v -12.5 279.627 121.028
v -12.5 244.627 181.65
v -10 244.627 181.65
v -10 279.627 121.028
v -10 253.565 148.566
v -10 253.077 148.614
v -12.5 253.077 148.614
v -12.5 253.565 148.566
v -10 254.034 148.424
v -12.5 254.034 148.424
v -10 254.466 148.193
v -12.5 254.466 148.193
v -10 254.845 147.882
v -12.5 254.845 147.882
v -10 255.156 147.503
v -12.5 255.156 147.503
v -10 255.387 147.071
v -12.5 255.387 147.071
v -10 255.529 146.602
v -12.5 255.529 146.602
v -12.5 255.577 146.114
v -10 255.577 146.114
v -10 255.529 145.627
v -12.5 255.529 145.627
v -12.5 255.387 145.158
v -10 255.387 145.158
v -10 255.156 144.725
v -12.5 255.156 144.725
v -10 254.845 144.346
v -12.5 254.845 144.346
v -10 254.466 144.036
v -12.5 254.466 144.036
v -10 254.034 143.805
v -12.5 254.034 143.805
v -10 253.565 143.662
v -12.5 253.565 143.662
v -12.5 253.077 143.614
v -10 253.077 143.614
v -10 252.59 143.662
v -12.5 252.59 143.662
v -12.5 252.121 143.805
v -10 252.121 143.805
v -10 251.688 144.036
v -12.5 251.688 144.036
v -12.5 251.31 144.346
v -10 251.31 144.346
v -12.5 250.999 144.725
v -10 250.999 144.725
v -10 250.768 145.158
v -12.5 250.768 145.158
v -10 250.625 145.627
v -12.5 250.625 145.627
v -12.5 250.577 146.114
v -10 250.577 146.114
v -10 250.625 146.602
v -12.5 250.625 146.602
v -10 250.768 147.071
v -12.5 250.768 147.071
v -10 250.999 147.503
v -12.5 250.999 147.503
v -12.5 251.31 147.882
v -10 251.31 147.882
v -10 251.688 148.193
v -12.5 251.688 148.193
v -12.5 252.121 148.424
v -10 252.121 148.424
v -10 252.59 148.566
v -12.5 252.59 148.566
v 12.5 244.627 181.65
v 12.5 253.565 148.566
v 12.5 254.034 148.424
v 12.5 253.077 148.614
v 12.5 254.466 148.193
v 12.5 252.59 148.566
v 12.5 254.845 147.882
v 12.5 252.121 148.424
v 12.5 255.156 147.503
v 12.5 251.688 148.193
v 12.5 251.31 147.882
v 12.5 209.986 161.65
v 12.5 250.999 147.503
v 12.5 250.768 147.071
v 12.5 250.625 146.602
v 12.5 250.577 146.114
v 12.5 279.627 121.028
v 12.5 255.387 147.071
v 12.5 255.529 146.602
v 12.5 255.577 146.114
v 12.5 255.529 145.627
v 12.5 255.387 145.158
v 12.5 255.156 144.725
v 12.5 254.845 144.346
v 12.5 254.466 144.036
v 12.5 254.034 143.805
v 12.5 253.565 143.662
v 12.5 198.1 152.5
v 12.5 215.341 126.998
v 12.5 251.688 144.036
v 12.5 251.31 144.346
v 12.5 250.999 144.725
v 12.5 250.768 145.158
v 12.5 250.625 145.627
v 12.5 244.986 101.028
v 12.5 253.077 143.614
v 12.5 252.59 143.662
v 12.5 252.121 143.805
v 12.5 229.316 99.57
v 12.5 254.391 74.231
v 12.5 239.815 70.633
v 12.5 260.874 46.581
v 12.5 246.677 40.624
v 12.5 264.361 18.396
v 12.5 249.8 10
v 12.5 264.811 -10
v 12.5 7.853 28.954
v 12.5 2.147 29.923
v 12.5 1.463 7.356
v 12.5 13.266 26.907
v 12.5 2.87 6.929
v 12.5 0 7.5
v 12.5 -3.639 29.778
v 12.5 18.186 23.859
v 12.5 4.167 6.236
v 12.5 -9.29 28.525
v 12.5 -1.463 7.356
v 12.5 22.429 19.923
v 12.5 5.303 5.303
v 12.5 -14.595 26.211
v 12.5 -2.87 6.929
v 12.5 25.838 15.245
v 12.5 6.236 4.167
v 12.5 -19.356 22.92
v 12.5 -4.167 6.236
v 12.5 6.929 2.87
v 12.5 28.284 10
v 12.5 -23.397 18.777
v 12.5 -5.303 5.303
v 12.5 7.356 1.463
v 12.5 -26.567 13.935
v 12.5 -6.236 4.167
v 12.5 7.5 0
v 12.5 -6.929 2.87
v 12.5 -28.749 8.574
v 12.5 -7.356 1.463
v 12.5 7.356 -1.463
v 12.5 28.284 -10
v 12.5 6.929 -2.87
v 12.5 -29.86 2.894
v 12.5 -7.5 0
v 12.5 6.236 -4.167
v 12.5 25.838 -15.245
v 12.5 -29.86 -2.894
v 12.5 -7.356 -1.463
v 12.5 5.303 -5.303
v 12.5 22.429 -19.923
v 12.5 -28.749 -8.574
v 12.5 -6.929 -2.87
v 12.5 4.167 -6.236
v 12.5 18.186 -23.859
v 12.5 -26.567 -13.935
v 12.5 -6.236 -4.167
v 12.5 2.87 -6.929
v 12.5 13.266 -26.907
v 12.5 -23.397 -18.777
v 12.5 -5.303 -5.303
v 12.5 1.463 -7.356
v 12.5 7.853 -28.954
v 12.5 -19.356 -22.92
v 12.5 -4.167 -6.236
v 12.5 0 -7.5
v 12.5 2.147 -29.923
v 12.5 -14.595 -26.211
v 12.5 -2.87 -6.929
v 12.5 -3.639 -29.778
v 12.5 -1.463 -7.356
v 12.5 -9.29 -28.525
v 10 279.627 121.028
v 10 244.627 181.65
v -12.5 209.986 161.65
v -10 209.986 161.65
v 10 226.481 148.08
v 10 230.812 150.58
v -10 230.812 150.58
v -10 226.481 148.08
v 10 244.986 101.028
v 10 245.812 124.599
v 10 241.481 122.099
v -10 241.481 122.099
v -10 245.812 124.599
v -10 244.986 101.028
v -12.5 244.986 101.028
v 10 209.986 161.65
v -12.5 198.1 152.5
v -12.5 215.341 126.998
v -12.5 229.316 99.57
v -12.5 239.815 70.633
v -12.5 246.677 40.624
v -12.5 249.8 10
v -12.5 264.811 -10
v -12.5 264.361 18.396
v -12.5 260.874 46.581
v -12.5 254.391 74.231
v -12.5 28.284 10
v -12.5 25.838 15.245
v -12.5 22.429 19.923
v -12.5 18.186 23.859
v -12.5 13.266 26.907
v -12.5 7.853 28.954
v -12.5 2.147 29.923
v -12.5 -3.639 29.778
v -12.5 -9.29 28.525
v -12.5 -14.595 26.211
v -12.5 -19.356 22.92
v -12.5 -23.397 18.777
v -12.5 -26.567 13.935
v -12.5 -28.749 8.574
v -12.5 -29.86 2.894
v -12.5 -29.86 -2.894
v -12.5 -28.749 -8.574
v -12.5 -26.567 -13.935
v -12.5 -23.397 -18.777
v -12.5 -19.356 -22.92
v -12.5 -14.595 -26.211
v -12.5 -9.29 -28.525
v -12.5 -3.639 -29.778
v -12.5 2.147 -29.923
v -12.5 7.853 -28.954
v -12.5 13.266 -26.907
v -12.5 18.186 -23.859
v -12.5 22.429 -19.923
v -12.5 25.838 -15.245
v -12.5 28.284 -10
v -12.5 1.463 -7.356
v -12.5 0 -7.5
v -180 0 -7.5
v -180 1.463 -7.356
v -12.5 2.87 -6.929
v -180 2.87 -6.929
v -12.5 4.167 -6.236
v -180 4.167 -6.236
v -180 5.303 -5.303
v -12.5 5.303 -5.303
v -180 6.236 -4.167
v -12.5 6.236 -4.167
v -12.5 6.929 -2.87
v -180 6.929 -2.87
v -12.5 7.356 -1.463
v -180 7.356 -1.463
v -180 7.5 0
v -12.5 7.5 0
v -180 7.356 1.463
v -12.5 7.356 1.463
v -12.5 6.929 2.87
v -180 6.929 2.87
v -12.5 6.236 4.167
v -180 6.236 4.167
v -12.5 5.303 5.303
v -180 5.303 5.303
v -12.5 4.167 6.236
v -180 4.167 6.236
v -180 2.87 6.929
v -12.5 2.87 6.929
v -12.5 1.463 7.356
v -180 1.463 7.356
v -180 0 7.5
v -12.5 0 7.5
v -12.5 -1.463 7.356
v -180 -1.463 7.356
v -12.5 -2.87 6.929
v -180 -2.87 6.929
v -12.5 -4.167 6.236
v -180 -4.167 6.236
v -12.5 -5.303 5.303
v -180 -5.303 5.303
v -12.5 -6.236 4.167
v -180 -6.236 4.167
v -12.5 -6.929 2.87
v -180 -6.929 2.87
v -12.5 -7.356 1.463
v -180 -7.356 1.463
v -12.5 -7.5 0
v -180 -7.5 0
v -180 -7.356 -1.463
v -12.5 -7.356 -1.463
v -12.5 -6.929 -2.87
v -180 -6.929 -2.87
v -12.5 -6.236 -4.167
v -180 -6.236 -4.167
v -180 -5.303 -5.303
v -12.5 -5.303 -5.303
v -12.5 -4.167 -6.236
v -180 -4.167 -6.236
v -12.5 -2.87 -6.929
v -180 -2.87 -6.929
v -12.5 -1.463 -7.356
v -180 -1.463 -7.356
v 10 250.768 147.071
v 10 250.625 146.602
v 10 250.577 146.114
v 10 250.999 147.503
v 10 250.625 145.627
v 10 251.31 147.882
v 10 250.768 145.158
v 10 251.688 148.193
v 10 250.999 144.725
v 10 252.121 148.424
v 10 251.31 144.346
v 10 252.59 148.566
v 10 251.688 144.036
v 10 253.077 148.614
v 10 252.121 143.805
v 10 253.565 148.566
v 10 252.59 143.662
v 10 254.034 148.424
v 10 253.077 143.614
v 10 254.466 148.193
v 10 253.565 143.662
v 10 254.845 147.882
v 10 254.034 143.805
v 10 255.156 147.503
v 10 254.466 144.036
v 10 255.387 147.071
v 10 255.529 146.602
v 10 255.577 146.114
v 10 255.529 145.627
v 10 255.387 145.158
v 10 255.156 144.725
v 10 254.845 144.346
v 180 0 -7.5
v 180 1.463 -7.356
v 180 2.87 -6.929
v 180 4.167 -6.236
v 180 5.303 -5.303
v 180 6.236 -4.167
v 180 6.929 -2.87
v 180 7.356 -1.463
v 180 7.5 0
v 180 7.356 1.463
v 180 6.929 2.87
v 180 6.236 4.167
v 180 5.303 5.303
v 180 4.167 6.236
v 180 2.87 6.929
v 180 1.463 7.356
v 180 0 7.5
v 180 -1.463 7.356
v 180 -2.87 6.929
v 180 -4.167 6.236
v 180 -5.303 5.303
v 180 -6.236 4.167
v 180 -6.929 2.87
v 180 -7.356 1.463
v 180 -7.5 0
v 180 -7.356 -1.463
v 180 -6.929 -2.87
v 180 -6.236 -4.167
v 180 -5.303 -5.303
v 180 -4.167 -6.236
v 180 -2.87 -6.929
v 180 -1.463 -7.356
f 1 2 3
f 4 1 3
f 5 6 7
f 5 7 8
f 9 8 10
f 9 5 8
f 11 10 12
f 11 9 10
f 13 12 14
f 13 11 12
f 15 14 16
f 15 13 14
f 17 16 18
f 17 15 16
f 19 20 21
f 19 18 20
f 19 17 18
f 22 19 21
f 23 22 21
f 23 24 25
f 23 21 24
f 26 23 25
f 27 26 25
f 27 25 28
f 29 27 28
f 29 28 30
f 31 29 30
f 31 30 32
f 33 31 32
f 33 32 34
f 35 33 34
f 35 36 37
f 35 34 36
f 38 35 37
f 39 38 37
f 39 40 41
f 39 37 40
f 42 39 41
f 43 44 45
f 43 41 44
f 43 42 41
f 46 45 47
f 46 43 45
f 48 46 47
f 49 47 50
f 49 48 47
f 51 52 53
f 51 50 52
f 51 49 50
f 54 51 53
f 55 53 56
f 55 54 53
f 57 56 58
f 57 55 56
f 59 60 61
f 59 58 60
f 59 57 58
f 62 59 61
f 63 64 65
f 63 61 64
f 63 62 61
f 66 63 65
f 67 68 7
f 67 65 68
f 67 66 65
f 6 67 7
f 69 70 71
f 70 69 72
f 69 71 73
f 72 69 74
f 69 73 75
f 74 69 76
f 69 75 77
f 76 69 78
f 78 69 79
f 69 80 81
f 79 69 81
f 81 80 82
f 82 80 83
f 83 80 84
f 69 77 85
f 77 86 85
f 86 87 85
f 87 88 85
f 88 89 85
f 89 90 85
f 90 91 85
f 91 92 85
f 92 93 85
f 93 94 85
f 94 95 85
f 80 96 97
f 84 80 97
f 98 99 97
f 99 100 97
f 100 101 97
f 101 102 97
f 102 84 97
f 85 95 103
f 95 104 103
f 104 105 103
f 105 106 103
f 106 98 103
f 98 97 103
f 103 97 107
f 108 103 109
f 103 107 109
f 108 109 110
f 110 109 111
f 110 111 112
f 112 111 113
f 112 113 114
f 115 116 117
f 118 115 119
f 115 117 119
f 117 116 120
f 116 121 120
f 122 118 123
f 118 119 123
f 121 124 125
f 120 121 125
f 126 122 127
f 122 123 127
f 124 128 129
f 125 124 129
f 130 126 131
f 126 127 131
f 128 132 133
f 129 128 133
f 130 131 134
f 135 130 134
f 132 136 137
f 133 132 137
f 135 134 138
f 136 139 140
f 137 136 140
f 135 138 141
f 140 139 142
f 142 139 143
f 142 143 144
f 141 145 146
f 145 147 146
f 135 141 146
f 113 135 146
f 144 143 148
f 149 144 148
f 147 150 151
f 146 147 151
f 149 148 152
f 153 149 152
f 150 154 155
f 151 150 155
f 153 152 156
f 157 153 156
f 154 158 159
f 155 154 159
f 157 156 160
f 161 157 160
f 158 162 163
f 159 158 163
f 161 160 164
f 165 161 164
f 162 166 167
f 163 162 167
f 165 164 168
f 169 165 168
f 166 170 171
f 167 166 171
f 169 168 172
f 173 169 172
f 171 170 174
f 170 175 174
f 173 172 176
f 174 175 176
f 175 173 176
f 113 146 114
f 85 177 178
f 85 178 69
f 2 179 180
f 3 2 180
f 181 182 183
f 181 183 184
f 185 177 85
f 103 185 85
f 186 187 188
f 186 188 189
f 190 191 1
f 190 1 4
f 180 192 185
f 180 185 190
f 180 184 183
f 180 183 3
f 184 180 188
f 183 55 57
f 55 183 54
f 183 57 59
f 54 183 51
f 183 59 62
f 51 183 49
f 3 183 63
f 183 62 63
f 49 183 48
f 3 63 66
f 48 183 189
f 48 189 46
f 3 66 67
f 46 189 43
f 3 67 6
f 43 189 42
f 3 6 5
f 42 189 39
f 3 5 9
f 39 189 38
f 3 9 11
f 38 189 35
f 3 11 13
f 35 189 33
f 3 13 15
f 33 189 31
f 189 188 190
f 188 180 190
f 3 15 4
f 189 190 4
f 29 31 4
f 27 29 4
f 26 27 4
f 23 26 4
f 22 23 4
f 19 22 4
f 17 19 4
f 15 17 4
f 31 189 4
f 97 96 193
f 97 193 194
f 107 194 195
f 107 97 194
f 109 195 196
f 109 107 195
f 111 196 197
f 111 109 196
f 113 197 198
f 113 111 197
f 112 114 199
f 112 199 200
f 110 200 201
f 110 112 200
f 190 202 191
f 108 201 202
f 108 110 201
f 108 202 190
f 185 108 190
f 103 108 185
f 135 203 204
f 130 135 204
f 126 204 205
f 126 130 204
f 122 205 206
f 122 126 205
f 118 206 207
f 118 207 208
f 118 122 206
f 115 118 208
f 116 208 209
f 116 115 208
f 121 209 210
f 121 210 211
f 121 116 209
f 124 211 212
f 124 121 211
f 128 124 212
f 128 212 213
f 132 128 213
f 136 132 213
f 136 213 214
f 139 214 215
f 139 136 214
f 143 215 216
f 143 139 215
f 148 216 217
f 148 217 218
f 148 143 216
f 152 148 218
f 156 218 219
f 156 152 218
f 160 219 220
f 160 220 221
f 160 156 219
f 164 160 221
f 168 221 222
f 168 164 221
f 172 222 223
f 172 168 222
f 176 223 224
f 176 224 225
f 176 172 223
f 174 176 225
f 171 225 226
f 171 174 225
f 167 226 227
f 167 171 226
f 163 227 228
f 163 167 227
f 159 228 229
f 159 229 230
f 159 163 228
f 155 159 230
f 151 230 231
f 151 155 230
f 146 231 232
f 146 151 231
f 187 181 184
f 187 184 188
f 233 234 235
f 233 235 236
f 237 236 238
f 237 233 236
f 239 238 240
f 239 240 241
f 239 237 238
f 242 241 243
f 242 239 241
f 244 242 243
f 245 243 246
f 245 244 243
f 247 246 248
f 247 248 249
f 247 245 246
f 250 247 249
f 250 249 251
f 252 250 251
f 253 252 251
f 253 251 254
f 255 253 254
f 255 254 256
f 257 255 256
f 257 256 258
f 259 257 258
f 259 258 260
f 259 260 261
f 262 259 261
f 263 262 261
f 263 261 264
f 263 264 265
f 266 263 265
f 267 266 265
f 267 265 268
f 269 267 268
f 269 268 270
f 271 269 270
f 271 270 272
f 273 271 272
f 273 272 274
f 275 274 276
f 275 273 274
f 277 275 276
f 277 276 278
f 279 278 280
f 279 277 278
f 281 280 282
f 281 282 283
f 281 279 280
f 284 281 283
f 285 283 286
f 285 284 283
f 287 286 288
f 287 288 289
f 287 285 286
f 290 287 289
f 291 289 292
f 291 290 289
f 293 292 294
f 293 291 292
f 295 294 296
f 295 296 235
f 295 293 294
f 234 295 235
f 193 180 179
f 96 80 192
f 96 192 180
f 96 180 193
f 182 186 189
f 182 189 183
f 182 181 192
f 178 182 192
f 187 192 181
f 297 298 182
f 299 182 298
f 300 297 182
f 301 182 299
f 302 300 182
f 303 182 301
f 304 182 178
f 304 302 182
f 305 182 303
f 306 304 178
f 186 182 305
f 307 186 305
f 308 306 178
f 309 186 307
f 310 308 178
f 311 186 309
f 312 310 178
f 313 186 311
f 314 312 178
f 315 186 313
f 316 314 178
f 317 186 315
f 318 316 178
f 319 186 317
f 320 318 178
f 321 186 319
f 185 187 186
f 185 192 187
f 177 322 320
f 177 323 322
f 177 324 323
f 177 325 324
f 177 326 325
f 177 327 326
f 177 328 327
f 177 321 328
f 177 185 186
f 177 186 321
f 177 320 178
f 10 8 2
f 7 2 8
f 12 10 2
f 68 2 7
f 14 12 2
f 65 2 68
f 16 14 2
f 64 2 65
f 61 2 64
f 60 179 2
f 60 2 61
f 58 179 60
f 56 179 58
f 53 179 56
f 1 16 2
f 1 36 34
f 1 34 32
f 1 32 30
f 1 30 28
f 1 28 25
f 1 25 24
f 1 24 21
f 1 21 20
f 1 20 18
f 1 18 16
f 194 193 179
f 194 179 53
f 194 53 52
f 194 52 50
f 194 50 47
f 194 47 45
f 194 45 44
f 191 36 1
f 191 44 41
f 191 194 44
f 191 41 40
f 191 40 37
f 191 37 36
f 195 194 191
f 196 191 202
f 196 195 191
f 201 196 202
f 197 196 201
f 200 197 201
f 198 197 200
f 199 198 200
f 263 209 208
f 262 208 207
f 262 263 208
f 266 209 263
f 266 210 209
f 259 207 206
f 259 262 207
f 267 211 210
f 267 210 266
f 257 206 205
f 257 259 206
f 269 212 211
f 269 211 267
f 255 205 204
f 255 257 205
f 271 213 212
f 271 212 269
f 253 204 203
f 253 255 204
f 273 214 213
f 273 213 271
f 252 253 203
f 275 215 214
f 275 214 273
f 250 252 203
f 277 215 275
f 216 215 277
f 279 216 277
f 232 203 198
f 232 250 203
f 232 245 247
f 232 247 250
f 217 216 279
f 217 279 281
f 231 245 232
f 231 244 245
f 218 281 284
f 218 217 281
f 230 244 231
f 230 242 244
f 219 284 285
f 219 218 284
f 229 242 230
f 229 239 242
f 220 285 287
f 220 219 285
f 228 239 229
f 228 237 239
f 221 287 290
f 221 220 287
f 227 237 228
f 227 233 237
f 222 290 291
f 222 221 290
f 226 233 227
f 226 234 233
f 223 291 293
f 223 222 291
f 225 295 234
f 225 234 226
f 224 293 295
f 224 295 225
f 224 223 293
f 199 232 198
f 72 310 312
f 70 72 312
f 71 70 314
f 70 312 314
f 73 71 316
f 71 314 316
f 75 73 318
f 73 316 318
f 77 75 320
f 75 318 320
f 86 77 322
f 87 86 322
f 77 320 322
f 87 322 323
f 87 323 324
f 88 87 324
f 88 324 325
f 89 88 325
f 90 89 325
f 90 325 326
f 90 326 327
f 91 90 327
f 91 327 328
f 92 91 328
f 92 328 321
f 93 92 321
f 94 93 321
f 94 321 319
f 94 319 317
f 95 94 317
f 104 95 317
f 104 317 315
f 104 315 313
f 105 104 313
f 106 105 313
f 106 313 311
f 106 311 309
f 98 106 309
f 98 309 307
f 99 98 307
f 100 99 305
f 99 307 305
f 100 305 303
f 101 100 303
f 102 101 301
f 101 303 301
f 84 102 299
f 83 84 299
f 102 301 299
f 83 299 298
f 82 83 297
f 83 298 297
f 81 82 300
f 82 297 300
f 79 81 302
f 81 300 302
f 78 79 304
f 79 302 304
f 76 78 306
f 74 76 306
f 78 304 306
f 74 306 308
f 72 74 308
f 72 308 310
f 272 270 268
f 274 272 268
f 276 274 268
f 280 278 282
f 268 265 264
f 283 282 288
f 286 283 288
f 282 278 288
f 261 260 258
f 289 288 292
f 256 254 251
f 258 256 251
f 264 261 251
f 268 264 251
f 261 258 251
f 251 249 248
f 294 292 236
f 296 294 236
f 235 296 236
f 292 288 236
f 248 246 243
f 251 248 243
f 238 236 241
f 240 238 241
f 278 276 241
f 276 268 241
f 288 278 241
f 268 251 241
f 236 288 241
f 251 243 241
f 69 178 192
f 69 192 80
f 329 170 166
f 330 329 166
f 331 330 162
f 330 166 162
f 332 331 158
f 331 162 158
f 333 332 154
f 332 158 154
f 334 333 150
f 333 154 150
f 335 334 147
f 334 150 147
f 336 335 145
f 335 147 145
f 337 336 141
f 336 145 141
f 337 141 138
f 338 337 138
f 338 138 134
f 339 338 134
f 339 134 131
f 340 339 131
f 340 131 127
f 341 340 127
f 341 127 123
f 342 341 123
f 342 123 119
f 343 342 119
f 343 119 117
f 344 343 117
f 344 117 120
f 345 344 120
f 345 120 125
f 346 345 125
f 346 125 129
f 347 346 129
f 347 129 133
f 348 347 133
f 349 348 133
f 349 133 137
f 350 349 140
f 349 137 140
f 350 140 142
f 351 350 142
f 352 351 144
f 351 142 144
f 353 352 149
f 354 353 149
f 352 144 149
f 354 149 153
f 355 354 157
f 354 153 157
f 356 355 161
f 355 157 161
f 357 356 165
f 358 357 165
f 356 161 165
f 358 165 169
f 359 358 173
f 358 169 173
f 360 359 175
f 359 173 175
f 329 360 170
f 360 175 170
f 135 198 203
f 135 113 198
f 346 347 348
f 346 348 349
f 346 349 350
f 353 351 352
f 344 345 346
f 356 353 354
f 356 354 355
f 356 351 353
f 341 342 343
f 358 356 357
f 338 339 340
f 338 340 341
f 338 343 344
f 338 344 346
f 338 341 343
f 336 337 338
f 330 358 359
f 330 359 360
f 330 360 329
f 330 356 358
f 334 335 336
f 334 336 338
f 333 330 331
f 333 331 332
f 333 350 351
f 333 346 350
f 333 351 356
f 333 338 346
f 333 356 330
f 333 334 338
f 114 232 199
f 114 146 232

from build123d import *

# Parameters (mm, degrees)
BOSS_EXTRUDE1_DEPTH      = 12.5
BOSS_EXTRUDE1_DEPTH_BACK = 12.5
SKETCH11_R               = 7.5
BOSS_EXTRUDE4_DEPTH      = 180
BOSS_EXTRUDE4_DEPTH_BACK = 180
SKETCH12_W               = 25
SKETCH12_H               = 70
BOSS_EXTRUDE5_DEPTH      = 40
SKETCH13_W               = 20
SKETCH13_H               = 40
CUT_EXTRUDE2_DEPTH       = 70
SKETCH15_R               = 2.5
CUT_EXTRUDE3_DEPTH       = 191
CUT_EXTRUDE3_DEPTH_BACK  = 171
BOSS_EXTRUDE8_DEPTH      = 20


with BuildPart() as part:
    # Sketch1 → Boss-Extrude1 (new body, two sides)
    with BuildSketch(Plane(origin=(0, 0, 0), x_dir=(0, 0, -1), z_dir=(1, 0, 0))) as boss_extrude1_sk:
        with BuildLine():
            Line((10, 28.284271247), (10, 264.811253537))
            ThreePointArc((10, 264.811253537), (-46.581095136, 260.873918926), (-101.028366233, 244.986263322))
            Line((-101.028366233, 244.986263322), (-161.650144498, 209.986263322))
            Line((-161.650144498, 209.986263322), (-152.500136319, 198.100248417))
            ThreePointArc((-152.500136319, 198.100248417), (-85.263049352, 235.011089984), (-10, 249.799919936))
            Line((-10, 249.799919936), (-10, 28.284271247))
            ThreePointArc((-10, 28.284271247), (0, -30), (10, 28.284271247))
        make_face()
    extrude(amount=BOSS_EXTRUDE1_DEPTH)
    extrude(boss_extrude1_sk.sketch, amount=-BOSS_EXTRUDE1_DEPTH_BACK)

    # Sketch11 → Boss-Extrude4 (add, two sides)
    with BuildSketch(Plane(origin=(0, 0, 0), x_dir=(0, 0, -1), z_dir=(1, 0, 0))) as boss_extrude4_sk:
        Circle(SKETCH11_R)
    extrude(amount=BOSS_EXTRUDE4_DEPTH)
    extrude(boss_extrude4_sk.sketch, amount=-BOSS_EXTRUDE4_DEPTH_BACK)

    # Sketch12 → Boss-Extrude5 (add)
    with BuildSketch(Plane(origin=(0, 227.486263322, 131.339255366), x_dir=(1, 0, 0), z_dir=(0, 0.866025404, 0.5))):
        Rectangle(SKETCH12_W, SKETCH12_H)
    extrude(amount=BOSS_EXTRUDE5_DEPTH)

    # Sketch13 → Cut-Extrude2 (cut)
    with BuildSketch(Plane(origin=(0, 17.5, -30.310889132), x_dir=(-1, 0, 0), z_dir=(0, 0.5, -0.866025404))):
        with Locations((0, 282.678510731)):
            Rectangle(SKETCH13_W, SKETCH13_H)
    extrude(amount=-CUT_EXTRUDE2_DEPTH, mode=Mode.SUBTRACT)

    # Sketch15 → Cut-Extrude3 (cut, two sides)
    with BuildSketch(Plane.ZY.offset(-10)) as cut_extrude3_sk:
        with Locations((146.114255366, 253.077314003)):
            Circle(SKETCH15_R)
    extrude(amount=CUT_EXTRUDE3_DEPTH, mode=Mode.SUBTRACT)
    extrude(cut_extrude3_sk.sketch, amount=-CUT_EXTRUDE3_DEPTH_BACK, mode=Mode.SUBTRACT)

    # Sketch16 → Boss-Extrude8 (add)
    with BuildSketch(Plane.ZY.offset(-10)):
        Polygon((122.098874309, 241.48145385), (124.598874309, 245.811580869), (150.579636422, 230.811580869), (148.079636422, 226.48145385), align=None)
    extrude(amount=BOSS_EXTRUDE8_DEPTH)


solid = part.part
